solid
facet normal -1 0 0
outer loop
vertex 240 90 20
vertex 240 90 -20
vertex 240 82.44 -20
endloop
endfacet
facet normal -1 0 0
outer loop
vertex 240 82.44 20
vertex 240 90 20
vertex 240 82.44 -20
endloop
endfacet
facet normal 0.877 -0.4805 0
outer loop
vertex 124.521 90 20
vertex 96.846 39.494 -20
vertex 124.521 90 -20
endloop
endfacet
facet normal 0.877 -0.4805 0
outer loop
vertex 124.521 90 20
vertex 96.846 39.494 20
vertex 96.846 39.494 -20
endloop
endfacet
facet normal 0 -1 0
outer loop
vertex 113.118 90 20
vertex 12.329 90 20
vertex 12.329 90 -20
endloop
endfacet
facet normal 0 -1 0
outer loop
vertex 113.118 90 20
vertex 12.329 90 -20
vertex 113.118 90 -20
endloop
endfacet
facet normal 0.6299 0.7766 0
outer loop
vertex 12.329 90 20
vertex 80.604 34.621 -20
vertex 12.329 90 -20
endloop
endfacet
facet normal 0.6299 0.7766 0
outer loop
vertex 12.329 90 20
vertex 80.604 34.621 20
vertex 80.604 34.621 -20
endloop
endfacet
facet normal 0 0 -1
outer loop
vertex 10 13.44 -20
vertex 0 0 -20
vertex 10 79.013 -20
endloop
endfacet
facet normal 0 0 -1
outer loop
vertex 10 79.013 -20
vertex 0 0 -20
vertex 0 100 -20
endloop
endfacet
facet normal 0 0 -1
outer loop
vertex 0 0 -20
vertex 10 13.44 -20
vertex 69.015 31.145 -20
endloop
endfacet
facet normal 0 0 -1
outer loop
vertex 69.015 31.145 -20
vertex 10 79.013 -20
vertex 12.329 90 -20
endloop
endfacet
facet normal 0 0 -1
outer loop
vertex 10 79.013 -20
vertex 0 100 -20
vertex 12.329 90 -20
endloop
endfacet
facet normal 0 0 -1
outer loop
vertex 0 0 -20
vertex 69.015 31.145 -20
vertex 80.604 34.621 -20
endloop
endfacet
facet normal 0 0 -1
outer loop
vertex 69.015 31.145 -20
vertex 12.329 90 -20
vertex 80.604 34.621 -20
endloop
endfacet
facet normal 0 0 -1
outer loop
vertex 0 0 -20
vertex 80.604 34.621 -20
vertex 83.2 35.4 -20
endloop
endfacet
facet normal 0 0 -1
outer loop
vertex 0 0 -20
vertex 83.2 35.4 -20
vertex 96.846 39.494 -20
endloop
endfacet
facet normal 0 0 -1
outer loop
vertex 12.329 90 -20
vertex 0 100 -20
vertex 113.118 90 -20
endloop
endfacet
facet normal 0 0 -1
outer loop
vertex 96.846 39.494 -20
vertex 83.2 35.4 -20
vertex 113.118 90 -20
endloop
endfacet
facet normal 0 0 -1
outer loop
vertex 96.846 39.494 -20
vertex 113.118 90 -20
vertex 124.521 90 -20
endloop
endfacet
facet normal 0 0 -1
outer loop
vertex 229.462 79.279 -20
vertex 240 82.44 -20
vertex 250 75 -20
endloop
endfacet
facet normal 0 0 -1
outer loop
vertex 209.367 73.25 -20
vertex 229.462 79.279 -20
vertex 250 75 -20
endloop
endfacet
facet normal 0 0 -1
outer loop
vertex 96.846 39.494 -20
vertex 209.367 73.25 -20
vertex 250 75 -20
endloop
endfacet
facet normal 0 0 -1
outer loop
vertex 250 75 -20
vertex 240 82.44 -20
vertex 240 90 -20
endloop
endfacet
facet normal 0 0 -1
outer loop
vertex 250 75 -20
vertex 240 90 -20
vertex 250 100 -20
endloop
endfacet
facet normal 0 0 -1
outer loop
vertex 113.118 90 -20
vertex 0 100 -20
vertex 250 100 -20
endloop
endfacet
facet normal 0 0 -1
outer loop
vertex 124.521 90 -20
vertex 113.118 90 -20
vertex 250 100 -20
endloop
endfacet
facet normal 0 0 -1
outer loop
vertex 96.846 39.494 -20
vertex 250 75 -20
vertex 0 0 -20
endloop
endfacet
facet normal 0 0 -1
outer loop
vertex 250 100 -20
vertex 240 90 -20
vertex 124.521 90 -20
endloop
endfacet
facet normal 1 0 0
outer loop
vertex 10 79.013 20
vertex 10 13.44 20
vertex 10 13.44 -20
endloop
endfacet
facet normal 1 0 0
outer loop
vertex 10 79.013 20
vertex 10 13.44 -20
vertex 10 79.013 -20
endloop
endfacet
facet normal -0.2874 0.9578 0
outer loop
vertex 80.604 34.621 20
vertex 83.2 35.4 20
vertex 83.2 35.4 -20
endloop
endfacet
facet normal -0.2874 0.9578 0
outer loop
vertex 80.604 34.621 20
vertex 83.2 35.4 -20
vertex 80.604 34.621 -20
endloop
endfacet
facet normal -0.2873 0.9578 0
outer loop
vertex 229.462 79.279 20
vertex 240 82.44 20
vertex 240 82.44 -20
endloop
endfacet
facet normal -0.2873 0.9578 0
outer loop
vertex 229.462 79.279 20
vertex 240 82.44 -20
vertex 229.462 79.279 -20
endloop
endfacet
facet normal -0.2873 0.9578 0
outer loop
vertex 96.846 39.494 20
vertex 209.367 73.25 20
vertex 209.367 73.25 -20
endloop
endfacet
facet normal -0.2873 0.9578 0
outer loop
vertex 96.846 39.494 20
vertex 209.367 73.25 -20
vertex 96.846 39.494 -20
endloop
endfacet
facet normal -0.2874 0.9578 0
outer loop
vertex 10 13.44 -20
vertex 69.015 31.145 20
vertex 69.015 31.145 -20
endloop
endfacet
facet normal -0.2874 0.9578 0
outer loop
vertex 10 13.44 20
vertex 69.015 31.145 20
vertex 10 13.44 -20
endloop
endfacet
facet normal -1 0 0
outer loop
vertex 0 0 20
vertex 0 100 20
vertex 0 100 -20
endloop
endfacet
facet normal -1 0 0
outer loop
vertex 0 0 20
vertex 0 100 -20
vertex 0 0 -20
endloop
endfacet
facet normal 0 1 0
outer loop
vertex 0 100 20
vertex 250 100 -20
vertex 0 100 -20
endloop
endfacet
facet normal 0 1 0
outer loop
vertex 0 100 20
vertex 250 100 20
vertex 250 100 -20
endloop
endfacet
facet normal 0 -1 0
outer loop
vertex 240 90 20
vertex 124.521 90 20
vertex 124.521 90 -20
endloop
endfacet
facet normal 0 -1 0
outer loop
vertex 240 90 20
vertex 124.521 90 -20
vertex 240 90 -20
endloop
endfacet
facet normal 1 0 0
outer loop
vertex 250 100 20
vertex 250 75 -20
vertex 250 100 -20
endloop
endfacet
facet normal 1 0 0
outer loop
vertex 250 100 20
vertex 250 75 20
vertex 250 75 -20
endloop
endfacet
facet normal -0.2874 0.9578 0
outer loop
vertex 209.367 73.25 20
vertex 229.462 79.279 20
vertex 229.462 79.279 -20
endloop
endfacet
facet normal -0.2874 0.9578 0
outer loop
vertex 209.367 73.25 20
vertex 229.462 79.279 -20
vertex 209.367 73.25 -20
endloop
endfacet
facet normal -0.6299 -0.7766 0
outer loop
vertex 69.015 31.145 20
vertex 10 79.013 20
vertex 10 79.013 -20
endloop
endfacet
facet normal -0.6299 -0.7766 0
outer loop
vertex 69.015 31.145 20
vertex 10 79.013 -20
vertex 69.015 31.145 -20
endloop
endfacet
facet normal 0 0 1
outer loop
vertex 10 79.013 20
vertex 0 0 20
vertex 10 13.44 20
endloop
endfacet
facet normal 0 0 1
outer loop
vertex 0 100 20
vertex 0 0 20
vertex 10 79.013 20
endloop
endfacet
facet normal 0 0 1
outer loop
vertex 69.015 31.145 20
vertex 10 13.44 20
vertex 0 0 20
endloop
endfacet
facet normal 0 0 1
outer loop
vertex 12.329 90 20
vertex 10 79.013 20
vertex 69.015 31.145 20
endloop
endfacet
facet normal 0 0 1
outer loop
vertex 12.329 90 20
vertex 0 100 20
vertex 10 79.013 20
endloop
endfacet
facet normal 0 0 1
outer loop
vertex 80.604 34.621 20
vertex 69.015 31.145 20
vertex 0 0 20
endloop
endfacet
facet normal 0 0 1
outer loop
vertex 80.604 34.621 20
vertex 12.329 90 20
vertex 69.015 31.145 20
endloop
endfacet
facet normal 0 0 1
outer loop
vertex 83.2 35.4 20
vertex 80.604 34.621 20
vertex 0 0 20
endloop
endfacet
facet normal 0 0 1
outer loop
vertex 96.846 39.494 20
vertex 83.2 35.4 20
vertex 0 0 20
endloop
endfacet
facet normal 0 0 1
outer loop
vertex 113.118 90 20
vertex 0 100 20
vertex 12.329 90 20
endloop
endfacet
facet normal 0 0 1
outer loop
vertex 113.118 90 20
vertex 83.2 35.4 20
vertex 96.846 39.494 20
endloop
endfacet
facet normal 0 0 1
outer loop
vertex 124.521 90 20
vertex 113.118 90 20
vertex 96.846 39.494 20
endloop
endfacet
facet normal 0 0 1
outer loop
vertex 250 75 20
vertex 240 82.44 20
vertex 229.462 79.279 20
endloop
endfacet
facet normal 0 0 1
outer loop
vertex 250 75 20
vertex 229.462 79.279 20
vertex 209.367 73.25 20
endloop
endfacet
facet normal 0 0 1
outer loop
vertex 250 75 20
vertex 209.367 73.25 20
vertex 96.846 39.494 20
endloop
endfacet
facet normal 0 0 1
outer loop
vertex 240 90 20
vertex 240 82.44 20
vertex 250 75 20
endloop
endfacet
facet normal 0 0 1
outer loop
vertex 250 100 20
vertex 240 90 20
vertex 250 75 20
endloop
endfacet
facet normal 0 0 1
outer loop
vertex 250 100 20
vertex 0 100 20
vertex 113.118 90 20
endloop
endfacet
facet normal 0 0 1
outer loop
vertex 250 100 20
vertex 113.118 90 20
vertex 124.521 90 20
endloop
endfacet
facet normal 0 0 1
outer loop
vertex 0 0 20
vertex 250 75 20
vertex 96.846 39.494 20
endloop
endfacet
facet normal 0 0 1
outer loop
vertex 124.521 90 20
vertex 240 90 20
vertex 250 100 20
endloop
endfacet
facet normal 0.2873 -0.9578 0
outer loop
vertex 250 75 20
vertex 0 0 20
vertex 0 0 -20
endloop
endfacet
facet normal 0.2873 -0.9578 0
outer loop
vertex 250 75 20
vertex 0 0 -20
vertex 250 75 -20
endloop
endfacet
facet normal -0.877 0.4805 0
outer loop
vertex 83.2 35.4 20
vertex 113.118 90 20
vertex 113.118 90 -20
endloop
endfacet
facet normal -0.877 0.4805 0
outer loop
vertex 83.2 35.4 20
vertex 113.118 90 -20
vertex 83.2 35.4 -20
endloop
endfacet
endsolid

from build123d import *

# Parameters (mm, degrees)
SALIENTE_EXTRUIR1_DEPTH = 20


with BuildPart() as part:
    # Croquis1 → Saliente-Extruir1 (new body, symmetric)
    with BuildSketch(Plane.XY):
        Polygon((130, 100), (0, 100), (12.328767123, 90), (113.117723961, 90), (124.520547945, 90), align=None)
        Polygon((12.328767123, 90), (0, 100), (0, 0), (90, 27), (80.603724142, 34.621423752), (69.015367917, 31.144916884), (10, 13.440306509), (10, 79.012937528), (10, 90), align=None)
        Polygon((80.603724142, 34.621423752), (12.328767123, 90), (10, 90), (10, 79.012937528), (69.015367917, 31.144916884), align=None)
        Polygon((124.520547945, 90), (113.117723961, 90), (83.200100156, 35.400336556), (96.846102629, 39.494137298), align=None)
        Polygon((83.200100156, 35.400336556), (80.603724142, 34.621423752), (90, 27), (96.846102629, 39.494137298), align=None)
        Polygon((96.846102629, 39.494137298), (90, 27), (250, 75), (229.461692114, 79.278814143), (209.367182815, 73.250461353), align=None)
        Polygon((250, 100), (130, 100), (178, 90), (240, 90), (240, 82.440306509), (229.461692114, 79.278814143), (250, 75), align=None)
        Polygon((178, 90), (130, 100), (124.520547945, 90), (128.969397311, 90), align=None)
    extrude(amount=SALIENTE_EXTRUIR1_DEPTH, both=True)


solid = part.part
